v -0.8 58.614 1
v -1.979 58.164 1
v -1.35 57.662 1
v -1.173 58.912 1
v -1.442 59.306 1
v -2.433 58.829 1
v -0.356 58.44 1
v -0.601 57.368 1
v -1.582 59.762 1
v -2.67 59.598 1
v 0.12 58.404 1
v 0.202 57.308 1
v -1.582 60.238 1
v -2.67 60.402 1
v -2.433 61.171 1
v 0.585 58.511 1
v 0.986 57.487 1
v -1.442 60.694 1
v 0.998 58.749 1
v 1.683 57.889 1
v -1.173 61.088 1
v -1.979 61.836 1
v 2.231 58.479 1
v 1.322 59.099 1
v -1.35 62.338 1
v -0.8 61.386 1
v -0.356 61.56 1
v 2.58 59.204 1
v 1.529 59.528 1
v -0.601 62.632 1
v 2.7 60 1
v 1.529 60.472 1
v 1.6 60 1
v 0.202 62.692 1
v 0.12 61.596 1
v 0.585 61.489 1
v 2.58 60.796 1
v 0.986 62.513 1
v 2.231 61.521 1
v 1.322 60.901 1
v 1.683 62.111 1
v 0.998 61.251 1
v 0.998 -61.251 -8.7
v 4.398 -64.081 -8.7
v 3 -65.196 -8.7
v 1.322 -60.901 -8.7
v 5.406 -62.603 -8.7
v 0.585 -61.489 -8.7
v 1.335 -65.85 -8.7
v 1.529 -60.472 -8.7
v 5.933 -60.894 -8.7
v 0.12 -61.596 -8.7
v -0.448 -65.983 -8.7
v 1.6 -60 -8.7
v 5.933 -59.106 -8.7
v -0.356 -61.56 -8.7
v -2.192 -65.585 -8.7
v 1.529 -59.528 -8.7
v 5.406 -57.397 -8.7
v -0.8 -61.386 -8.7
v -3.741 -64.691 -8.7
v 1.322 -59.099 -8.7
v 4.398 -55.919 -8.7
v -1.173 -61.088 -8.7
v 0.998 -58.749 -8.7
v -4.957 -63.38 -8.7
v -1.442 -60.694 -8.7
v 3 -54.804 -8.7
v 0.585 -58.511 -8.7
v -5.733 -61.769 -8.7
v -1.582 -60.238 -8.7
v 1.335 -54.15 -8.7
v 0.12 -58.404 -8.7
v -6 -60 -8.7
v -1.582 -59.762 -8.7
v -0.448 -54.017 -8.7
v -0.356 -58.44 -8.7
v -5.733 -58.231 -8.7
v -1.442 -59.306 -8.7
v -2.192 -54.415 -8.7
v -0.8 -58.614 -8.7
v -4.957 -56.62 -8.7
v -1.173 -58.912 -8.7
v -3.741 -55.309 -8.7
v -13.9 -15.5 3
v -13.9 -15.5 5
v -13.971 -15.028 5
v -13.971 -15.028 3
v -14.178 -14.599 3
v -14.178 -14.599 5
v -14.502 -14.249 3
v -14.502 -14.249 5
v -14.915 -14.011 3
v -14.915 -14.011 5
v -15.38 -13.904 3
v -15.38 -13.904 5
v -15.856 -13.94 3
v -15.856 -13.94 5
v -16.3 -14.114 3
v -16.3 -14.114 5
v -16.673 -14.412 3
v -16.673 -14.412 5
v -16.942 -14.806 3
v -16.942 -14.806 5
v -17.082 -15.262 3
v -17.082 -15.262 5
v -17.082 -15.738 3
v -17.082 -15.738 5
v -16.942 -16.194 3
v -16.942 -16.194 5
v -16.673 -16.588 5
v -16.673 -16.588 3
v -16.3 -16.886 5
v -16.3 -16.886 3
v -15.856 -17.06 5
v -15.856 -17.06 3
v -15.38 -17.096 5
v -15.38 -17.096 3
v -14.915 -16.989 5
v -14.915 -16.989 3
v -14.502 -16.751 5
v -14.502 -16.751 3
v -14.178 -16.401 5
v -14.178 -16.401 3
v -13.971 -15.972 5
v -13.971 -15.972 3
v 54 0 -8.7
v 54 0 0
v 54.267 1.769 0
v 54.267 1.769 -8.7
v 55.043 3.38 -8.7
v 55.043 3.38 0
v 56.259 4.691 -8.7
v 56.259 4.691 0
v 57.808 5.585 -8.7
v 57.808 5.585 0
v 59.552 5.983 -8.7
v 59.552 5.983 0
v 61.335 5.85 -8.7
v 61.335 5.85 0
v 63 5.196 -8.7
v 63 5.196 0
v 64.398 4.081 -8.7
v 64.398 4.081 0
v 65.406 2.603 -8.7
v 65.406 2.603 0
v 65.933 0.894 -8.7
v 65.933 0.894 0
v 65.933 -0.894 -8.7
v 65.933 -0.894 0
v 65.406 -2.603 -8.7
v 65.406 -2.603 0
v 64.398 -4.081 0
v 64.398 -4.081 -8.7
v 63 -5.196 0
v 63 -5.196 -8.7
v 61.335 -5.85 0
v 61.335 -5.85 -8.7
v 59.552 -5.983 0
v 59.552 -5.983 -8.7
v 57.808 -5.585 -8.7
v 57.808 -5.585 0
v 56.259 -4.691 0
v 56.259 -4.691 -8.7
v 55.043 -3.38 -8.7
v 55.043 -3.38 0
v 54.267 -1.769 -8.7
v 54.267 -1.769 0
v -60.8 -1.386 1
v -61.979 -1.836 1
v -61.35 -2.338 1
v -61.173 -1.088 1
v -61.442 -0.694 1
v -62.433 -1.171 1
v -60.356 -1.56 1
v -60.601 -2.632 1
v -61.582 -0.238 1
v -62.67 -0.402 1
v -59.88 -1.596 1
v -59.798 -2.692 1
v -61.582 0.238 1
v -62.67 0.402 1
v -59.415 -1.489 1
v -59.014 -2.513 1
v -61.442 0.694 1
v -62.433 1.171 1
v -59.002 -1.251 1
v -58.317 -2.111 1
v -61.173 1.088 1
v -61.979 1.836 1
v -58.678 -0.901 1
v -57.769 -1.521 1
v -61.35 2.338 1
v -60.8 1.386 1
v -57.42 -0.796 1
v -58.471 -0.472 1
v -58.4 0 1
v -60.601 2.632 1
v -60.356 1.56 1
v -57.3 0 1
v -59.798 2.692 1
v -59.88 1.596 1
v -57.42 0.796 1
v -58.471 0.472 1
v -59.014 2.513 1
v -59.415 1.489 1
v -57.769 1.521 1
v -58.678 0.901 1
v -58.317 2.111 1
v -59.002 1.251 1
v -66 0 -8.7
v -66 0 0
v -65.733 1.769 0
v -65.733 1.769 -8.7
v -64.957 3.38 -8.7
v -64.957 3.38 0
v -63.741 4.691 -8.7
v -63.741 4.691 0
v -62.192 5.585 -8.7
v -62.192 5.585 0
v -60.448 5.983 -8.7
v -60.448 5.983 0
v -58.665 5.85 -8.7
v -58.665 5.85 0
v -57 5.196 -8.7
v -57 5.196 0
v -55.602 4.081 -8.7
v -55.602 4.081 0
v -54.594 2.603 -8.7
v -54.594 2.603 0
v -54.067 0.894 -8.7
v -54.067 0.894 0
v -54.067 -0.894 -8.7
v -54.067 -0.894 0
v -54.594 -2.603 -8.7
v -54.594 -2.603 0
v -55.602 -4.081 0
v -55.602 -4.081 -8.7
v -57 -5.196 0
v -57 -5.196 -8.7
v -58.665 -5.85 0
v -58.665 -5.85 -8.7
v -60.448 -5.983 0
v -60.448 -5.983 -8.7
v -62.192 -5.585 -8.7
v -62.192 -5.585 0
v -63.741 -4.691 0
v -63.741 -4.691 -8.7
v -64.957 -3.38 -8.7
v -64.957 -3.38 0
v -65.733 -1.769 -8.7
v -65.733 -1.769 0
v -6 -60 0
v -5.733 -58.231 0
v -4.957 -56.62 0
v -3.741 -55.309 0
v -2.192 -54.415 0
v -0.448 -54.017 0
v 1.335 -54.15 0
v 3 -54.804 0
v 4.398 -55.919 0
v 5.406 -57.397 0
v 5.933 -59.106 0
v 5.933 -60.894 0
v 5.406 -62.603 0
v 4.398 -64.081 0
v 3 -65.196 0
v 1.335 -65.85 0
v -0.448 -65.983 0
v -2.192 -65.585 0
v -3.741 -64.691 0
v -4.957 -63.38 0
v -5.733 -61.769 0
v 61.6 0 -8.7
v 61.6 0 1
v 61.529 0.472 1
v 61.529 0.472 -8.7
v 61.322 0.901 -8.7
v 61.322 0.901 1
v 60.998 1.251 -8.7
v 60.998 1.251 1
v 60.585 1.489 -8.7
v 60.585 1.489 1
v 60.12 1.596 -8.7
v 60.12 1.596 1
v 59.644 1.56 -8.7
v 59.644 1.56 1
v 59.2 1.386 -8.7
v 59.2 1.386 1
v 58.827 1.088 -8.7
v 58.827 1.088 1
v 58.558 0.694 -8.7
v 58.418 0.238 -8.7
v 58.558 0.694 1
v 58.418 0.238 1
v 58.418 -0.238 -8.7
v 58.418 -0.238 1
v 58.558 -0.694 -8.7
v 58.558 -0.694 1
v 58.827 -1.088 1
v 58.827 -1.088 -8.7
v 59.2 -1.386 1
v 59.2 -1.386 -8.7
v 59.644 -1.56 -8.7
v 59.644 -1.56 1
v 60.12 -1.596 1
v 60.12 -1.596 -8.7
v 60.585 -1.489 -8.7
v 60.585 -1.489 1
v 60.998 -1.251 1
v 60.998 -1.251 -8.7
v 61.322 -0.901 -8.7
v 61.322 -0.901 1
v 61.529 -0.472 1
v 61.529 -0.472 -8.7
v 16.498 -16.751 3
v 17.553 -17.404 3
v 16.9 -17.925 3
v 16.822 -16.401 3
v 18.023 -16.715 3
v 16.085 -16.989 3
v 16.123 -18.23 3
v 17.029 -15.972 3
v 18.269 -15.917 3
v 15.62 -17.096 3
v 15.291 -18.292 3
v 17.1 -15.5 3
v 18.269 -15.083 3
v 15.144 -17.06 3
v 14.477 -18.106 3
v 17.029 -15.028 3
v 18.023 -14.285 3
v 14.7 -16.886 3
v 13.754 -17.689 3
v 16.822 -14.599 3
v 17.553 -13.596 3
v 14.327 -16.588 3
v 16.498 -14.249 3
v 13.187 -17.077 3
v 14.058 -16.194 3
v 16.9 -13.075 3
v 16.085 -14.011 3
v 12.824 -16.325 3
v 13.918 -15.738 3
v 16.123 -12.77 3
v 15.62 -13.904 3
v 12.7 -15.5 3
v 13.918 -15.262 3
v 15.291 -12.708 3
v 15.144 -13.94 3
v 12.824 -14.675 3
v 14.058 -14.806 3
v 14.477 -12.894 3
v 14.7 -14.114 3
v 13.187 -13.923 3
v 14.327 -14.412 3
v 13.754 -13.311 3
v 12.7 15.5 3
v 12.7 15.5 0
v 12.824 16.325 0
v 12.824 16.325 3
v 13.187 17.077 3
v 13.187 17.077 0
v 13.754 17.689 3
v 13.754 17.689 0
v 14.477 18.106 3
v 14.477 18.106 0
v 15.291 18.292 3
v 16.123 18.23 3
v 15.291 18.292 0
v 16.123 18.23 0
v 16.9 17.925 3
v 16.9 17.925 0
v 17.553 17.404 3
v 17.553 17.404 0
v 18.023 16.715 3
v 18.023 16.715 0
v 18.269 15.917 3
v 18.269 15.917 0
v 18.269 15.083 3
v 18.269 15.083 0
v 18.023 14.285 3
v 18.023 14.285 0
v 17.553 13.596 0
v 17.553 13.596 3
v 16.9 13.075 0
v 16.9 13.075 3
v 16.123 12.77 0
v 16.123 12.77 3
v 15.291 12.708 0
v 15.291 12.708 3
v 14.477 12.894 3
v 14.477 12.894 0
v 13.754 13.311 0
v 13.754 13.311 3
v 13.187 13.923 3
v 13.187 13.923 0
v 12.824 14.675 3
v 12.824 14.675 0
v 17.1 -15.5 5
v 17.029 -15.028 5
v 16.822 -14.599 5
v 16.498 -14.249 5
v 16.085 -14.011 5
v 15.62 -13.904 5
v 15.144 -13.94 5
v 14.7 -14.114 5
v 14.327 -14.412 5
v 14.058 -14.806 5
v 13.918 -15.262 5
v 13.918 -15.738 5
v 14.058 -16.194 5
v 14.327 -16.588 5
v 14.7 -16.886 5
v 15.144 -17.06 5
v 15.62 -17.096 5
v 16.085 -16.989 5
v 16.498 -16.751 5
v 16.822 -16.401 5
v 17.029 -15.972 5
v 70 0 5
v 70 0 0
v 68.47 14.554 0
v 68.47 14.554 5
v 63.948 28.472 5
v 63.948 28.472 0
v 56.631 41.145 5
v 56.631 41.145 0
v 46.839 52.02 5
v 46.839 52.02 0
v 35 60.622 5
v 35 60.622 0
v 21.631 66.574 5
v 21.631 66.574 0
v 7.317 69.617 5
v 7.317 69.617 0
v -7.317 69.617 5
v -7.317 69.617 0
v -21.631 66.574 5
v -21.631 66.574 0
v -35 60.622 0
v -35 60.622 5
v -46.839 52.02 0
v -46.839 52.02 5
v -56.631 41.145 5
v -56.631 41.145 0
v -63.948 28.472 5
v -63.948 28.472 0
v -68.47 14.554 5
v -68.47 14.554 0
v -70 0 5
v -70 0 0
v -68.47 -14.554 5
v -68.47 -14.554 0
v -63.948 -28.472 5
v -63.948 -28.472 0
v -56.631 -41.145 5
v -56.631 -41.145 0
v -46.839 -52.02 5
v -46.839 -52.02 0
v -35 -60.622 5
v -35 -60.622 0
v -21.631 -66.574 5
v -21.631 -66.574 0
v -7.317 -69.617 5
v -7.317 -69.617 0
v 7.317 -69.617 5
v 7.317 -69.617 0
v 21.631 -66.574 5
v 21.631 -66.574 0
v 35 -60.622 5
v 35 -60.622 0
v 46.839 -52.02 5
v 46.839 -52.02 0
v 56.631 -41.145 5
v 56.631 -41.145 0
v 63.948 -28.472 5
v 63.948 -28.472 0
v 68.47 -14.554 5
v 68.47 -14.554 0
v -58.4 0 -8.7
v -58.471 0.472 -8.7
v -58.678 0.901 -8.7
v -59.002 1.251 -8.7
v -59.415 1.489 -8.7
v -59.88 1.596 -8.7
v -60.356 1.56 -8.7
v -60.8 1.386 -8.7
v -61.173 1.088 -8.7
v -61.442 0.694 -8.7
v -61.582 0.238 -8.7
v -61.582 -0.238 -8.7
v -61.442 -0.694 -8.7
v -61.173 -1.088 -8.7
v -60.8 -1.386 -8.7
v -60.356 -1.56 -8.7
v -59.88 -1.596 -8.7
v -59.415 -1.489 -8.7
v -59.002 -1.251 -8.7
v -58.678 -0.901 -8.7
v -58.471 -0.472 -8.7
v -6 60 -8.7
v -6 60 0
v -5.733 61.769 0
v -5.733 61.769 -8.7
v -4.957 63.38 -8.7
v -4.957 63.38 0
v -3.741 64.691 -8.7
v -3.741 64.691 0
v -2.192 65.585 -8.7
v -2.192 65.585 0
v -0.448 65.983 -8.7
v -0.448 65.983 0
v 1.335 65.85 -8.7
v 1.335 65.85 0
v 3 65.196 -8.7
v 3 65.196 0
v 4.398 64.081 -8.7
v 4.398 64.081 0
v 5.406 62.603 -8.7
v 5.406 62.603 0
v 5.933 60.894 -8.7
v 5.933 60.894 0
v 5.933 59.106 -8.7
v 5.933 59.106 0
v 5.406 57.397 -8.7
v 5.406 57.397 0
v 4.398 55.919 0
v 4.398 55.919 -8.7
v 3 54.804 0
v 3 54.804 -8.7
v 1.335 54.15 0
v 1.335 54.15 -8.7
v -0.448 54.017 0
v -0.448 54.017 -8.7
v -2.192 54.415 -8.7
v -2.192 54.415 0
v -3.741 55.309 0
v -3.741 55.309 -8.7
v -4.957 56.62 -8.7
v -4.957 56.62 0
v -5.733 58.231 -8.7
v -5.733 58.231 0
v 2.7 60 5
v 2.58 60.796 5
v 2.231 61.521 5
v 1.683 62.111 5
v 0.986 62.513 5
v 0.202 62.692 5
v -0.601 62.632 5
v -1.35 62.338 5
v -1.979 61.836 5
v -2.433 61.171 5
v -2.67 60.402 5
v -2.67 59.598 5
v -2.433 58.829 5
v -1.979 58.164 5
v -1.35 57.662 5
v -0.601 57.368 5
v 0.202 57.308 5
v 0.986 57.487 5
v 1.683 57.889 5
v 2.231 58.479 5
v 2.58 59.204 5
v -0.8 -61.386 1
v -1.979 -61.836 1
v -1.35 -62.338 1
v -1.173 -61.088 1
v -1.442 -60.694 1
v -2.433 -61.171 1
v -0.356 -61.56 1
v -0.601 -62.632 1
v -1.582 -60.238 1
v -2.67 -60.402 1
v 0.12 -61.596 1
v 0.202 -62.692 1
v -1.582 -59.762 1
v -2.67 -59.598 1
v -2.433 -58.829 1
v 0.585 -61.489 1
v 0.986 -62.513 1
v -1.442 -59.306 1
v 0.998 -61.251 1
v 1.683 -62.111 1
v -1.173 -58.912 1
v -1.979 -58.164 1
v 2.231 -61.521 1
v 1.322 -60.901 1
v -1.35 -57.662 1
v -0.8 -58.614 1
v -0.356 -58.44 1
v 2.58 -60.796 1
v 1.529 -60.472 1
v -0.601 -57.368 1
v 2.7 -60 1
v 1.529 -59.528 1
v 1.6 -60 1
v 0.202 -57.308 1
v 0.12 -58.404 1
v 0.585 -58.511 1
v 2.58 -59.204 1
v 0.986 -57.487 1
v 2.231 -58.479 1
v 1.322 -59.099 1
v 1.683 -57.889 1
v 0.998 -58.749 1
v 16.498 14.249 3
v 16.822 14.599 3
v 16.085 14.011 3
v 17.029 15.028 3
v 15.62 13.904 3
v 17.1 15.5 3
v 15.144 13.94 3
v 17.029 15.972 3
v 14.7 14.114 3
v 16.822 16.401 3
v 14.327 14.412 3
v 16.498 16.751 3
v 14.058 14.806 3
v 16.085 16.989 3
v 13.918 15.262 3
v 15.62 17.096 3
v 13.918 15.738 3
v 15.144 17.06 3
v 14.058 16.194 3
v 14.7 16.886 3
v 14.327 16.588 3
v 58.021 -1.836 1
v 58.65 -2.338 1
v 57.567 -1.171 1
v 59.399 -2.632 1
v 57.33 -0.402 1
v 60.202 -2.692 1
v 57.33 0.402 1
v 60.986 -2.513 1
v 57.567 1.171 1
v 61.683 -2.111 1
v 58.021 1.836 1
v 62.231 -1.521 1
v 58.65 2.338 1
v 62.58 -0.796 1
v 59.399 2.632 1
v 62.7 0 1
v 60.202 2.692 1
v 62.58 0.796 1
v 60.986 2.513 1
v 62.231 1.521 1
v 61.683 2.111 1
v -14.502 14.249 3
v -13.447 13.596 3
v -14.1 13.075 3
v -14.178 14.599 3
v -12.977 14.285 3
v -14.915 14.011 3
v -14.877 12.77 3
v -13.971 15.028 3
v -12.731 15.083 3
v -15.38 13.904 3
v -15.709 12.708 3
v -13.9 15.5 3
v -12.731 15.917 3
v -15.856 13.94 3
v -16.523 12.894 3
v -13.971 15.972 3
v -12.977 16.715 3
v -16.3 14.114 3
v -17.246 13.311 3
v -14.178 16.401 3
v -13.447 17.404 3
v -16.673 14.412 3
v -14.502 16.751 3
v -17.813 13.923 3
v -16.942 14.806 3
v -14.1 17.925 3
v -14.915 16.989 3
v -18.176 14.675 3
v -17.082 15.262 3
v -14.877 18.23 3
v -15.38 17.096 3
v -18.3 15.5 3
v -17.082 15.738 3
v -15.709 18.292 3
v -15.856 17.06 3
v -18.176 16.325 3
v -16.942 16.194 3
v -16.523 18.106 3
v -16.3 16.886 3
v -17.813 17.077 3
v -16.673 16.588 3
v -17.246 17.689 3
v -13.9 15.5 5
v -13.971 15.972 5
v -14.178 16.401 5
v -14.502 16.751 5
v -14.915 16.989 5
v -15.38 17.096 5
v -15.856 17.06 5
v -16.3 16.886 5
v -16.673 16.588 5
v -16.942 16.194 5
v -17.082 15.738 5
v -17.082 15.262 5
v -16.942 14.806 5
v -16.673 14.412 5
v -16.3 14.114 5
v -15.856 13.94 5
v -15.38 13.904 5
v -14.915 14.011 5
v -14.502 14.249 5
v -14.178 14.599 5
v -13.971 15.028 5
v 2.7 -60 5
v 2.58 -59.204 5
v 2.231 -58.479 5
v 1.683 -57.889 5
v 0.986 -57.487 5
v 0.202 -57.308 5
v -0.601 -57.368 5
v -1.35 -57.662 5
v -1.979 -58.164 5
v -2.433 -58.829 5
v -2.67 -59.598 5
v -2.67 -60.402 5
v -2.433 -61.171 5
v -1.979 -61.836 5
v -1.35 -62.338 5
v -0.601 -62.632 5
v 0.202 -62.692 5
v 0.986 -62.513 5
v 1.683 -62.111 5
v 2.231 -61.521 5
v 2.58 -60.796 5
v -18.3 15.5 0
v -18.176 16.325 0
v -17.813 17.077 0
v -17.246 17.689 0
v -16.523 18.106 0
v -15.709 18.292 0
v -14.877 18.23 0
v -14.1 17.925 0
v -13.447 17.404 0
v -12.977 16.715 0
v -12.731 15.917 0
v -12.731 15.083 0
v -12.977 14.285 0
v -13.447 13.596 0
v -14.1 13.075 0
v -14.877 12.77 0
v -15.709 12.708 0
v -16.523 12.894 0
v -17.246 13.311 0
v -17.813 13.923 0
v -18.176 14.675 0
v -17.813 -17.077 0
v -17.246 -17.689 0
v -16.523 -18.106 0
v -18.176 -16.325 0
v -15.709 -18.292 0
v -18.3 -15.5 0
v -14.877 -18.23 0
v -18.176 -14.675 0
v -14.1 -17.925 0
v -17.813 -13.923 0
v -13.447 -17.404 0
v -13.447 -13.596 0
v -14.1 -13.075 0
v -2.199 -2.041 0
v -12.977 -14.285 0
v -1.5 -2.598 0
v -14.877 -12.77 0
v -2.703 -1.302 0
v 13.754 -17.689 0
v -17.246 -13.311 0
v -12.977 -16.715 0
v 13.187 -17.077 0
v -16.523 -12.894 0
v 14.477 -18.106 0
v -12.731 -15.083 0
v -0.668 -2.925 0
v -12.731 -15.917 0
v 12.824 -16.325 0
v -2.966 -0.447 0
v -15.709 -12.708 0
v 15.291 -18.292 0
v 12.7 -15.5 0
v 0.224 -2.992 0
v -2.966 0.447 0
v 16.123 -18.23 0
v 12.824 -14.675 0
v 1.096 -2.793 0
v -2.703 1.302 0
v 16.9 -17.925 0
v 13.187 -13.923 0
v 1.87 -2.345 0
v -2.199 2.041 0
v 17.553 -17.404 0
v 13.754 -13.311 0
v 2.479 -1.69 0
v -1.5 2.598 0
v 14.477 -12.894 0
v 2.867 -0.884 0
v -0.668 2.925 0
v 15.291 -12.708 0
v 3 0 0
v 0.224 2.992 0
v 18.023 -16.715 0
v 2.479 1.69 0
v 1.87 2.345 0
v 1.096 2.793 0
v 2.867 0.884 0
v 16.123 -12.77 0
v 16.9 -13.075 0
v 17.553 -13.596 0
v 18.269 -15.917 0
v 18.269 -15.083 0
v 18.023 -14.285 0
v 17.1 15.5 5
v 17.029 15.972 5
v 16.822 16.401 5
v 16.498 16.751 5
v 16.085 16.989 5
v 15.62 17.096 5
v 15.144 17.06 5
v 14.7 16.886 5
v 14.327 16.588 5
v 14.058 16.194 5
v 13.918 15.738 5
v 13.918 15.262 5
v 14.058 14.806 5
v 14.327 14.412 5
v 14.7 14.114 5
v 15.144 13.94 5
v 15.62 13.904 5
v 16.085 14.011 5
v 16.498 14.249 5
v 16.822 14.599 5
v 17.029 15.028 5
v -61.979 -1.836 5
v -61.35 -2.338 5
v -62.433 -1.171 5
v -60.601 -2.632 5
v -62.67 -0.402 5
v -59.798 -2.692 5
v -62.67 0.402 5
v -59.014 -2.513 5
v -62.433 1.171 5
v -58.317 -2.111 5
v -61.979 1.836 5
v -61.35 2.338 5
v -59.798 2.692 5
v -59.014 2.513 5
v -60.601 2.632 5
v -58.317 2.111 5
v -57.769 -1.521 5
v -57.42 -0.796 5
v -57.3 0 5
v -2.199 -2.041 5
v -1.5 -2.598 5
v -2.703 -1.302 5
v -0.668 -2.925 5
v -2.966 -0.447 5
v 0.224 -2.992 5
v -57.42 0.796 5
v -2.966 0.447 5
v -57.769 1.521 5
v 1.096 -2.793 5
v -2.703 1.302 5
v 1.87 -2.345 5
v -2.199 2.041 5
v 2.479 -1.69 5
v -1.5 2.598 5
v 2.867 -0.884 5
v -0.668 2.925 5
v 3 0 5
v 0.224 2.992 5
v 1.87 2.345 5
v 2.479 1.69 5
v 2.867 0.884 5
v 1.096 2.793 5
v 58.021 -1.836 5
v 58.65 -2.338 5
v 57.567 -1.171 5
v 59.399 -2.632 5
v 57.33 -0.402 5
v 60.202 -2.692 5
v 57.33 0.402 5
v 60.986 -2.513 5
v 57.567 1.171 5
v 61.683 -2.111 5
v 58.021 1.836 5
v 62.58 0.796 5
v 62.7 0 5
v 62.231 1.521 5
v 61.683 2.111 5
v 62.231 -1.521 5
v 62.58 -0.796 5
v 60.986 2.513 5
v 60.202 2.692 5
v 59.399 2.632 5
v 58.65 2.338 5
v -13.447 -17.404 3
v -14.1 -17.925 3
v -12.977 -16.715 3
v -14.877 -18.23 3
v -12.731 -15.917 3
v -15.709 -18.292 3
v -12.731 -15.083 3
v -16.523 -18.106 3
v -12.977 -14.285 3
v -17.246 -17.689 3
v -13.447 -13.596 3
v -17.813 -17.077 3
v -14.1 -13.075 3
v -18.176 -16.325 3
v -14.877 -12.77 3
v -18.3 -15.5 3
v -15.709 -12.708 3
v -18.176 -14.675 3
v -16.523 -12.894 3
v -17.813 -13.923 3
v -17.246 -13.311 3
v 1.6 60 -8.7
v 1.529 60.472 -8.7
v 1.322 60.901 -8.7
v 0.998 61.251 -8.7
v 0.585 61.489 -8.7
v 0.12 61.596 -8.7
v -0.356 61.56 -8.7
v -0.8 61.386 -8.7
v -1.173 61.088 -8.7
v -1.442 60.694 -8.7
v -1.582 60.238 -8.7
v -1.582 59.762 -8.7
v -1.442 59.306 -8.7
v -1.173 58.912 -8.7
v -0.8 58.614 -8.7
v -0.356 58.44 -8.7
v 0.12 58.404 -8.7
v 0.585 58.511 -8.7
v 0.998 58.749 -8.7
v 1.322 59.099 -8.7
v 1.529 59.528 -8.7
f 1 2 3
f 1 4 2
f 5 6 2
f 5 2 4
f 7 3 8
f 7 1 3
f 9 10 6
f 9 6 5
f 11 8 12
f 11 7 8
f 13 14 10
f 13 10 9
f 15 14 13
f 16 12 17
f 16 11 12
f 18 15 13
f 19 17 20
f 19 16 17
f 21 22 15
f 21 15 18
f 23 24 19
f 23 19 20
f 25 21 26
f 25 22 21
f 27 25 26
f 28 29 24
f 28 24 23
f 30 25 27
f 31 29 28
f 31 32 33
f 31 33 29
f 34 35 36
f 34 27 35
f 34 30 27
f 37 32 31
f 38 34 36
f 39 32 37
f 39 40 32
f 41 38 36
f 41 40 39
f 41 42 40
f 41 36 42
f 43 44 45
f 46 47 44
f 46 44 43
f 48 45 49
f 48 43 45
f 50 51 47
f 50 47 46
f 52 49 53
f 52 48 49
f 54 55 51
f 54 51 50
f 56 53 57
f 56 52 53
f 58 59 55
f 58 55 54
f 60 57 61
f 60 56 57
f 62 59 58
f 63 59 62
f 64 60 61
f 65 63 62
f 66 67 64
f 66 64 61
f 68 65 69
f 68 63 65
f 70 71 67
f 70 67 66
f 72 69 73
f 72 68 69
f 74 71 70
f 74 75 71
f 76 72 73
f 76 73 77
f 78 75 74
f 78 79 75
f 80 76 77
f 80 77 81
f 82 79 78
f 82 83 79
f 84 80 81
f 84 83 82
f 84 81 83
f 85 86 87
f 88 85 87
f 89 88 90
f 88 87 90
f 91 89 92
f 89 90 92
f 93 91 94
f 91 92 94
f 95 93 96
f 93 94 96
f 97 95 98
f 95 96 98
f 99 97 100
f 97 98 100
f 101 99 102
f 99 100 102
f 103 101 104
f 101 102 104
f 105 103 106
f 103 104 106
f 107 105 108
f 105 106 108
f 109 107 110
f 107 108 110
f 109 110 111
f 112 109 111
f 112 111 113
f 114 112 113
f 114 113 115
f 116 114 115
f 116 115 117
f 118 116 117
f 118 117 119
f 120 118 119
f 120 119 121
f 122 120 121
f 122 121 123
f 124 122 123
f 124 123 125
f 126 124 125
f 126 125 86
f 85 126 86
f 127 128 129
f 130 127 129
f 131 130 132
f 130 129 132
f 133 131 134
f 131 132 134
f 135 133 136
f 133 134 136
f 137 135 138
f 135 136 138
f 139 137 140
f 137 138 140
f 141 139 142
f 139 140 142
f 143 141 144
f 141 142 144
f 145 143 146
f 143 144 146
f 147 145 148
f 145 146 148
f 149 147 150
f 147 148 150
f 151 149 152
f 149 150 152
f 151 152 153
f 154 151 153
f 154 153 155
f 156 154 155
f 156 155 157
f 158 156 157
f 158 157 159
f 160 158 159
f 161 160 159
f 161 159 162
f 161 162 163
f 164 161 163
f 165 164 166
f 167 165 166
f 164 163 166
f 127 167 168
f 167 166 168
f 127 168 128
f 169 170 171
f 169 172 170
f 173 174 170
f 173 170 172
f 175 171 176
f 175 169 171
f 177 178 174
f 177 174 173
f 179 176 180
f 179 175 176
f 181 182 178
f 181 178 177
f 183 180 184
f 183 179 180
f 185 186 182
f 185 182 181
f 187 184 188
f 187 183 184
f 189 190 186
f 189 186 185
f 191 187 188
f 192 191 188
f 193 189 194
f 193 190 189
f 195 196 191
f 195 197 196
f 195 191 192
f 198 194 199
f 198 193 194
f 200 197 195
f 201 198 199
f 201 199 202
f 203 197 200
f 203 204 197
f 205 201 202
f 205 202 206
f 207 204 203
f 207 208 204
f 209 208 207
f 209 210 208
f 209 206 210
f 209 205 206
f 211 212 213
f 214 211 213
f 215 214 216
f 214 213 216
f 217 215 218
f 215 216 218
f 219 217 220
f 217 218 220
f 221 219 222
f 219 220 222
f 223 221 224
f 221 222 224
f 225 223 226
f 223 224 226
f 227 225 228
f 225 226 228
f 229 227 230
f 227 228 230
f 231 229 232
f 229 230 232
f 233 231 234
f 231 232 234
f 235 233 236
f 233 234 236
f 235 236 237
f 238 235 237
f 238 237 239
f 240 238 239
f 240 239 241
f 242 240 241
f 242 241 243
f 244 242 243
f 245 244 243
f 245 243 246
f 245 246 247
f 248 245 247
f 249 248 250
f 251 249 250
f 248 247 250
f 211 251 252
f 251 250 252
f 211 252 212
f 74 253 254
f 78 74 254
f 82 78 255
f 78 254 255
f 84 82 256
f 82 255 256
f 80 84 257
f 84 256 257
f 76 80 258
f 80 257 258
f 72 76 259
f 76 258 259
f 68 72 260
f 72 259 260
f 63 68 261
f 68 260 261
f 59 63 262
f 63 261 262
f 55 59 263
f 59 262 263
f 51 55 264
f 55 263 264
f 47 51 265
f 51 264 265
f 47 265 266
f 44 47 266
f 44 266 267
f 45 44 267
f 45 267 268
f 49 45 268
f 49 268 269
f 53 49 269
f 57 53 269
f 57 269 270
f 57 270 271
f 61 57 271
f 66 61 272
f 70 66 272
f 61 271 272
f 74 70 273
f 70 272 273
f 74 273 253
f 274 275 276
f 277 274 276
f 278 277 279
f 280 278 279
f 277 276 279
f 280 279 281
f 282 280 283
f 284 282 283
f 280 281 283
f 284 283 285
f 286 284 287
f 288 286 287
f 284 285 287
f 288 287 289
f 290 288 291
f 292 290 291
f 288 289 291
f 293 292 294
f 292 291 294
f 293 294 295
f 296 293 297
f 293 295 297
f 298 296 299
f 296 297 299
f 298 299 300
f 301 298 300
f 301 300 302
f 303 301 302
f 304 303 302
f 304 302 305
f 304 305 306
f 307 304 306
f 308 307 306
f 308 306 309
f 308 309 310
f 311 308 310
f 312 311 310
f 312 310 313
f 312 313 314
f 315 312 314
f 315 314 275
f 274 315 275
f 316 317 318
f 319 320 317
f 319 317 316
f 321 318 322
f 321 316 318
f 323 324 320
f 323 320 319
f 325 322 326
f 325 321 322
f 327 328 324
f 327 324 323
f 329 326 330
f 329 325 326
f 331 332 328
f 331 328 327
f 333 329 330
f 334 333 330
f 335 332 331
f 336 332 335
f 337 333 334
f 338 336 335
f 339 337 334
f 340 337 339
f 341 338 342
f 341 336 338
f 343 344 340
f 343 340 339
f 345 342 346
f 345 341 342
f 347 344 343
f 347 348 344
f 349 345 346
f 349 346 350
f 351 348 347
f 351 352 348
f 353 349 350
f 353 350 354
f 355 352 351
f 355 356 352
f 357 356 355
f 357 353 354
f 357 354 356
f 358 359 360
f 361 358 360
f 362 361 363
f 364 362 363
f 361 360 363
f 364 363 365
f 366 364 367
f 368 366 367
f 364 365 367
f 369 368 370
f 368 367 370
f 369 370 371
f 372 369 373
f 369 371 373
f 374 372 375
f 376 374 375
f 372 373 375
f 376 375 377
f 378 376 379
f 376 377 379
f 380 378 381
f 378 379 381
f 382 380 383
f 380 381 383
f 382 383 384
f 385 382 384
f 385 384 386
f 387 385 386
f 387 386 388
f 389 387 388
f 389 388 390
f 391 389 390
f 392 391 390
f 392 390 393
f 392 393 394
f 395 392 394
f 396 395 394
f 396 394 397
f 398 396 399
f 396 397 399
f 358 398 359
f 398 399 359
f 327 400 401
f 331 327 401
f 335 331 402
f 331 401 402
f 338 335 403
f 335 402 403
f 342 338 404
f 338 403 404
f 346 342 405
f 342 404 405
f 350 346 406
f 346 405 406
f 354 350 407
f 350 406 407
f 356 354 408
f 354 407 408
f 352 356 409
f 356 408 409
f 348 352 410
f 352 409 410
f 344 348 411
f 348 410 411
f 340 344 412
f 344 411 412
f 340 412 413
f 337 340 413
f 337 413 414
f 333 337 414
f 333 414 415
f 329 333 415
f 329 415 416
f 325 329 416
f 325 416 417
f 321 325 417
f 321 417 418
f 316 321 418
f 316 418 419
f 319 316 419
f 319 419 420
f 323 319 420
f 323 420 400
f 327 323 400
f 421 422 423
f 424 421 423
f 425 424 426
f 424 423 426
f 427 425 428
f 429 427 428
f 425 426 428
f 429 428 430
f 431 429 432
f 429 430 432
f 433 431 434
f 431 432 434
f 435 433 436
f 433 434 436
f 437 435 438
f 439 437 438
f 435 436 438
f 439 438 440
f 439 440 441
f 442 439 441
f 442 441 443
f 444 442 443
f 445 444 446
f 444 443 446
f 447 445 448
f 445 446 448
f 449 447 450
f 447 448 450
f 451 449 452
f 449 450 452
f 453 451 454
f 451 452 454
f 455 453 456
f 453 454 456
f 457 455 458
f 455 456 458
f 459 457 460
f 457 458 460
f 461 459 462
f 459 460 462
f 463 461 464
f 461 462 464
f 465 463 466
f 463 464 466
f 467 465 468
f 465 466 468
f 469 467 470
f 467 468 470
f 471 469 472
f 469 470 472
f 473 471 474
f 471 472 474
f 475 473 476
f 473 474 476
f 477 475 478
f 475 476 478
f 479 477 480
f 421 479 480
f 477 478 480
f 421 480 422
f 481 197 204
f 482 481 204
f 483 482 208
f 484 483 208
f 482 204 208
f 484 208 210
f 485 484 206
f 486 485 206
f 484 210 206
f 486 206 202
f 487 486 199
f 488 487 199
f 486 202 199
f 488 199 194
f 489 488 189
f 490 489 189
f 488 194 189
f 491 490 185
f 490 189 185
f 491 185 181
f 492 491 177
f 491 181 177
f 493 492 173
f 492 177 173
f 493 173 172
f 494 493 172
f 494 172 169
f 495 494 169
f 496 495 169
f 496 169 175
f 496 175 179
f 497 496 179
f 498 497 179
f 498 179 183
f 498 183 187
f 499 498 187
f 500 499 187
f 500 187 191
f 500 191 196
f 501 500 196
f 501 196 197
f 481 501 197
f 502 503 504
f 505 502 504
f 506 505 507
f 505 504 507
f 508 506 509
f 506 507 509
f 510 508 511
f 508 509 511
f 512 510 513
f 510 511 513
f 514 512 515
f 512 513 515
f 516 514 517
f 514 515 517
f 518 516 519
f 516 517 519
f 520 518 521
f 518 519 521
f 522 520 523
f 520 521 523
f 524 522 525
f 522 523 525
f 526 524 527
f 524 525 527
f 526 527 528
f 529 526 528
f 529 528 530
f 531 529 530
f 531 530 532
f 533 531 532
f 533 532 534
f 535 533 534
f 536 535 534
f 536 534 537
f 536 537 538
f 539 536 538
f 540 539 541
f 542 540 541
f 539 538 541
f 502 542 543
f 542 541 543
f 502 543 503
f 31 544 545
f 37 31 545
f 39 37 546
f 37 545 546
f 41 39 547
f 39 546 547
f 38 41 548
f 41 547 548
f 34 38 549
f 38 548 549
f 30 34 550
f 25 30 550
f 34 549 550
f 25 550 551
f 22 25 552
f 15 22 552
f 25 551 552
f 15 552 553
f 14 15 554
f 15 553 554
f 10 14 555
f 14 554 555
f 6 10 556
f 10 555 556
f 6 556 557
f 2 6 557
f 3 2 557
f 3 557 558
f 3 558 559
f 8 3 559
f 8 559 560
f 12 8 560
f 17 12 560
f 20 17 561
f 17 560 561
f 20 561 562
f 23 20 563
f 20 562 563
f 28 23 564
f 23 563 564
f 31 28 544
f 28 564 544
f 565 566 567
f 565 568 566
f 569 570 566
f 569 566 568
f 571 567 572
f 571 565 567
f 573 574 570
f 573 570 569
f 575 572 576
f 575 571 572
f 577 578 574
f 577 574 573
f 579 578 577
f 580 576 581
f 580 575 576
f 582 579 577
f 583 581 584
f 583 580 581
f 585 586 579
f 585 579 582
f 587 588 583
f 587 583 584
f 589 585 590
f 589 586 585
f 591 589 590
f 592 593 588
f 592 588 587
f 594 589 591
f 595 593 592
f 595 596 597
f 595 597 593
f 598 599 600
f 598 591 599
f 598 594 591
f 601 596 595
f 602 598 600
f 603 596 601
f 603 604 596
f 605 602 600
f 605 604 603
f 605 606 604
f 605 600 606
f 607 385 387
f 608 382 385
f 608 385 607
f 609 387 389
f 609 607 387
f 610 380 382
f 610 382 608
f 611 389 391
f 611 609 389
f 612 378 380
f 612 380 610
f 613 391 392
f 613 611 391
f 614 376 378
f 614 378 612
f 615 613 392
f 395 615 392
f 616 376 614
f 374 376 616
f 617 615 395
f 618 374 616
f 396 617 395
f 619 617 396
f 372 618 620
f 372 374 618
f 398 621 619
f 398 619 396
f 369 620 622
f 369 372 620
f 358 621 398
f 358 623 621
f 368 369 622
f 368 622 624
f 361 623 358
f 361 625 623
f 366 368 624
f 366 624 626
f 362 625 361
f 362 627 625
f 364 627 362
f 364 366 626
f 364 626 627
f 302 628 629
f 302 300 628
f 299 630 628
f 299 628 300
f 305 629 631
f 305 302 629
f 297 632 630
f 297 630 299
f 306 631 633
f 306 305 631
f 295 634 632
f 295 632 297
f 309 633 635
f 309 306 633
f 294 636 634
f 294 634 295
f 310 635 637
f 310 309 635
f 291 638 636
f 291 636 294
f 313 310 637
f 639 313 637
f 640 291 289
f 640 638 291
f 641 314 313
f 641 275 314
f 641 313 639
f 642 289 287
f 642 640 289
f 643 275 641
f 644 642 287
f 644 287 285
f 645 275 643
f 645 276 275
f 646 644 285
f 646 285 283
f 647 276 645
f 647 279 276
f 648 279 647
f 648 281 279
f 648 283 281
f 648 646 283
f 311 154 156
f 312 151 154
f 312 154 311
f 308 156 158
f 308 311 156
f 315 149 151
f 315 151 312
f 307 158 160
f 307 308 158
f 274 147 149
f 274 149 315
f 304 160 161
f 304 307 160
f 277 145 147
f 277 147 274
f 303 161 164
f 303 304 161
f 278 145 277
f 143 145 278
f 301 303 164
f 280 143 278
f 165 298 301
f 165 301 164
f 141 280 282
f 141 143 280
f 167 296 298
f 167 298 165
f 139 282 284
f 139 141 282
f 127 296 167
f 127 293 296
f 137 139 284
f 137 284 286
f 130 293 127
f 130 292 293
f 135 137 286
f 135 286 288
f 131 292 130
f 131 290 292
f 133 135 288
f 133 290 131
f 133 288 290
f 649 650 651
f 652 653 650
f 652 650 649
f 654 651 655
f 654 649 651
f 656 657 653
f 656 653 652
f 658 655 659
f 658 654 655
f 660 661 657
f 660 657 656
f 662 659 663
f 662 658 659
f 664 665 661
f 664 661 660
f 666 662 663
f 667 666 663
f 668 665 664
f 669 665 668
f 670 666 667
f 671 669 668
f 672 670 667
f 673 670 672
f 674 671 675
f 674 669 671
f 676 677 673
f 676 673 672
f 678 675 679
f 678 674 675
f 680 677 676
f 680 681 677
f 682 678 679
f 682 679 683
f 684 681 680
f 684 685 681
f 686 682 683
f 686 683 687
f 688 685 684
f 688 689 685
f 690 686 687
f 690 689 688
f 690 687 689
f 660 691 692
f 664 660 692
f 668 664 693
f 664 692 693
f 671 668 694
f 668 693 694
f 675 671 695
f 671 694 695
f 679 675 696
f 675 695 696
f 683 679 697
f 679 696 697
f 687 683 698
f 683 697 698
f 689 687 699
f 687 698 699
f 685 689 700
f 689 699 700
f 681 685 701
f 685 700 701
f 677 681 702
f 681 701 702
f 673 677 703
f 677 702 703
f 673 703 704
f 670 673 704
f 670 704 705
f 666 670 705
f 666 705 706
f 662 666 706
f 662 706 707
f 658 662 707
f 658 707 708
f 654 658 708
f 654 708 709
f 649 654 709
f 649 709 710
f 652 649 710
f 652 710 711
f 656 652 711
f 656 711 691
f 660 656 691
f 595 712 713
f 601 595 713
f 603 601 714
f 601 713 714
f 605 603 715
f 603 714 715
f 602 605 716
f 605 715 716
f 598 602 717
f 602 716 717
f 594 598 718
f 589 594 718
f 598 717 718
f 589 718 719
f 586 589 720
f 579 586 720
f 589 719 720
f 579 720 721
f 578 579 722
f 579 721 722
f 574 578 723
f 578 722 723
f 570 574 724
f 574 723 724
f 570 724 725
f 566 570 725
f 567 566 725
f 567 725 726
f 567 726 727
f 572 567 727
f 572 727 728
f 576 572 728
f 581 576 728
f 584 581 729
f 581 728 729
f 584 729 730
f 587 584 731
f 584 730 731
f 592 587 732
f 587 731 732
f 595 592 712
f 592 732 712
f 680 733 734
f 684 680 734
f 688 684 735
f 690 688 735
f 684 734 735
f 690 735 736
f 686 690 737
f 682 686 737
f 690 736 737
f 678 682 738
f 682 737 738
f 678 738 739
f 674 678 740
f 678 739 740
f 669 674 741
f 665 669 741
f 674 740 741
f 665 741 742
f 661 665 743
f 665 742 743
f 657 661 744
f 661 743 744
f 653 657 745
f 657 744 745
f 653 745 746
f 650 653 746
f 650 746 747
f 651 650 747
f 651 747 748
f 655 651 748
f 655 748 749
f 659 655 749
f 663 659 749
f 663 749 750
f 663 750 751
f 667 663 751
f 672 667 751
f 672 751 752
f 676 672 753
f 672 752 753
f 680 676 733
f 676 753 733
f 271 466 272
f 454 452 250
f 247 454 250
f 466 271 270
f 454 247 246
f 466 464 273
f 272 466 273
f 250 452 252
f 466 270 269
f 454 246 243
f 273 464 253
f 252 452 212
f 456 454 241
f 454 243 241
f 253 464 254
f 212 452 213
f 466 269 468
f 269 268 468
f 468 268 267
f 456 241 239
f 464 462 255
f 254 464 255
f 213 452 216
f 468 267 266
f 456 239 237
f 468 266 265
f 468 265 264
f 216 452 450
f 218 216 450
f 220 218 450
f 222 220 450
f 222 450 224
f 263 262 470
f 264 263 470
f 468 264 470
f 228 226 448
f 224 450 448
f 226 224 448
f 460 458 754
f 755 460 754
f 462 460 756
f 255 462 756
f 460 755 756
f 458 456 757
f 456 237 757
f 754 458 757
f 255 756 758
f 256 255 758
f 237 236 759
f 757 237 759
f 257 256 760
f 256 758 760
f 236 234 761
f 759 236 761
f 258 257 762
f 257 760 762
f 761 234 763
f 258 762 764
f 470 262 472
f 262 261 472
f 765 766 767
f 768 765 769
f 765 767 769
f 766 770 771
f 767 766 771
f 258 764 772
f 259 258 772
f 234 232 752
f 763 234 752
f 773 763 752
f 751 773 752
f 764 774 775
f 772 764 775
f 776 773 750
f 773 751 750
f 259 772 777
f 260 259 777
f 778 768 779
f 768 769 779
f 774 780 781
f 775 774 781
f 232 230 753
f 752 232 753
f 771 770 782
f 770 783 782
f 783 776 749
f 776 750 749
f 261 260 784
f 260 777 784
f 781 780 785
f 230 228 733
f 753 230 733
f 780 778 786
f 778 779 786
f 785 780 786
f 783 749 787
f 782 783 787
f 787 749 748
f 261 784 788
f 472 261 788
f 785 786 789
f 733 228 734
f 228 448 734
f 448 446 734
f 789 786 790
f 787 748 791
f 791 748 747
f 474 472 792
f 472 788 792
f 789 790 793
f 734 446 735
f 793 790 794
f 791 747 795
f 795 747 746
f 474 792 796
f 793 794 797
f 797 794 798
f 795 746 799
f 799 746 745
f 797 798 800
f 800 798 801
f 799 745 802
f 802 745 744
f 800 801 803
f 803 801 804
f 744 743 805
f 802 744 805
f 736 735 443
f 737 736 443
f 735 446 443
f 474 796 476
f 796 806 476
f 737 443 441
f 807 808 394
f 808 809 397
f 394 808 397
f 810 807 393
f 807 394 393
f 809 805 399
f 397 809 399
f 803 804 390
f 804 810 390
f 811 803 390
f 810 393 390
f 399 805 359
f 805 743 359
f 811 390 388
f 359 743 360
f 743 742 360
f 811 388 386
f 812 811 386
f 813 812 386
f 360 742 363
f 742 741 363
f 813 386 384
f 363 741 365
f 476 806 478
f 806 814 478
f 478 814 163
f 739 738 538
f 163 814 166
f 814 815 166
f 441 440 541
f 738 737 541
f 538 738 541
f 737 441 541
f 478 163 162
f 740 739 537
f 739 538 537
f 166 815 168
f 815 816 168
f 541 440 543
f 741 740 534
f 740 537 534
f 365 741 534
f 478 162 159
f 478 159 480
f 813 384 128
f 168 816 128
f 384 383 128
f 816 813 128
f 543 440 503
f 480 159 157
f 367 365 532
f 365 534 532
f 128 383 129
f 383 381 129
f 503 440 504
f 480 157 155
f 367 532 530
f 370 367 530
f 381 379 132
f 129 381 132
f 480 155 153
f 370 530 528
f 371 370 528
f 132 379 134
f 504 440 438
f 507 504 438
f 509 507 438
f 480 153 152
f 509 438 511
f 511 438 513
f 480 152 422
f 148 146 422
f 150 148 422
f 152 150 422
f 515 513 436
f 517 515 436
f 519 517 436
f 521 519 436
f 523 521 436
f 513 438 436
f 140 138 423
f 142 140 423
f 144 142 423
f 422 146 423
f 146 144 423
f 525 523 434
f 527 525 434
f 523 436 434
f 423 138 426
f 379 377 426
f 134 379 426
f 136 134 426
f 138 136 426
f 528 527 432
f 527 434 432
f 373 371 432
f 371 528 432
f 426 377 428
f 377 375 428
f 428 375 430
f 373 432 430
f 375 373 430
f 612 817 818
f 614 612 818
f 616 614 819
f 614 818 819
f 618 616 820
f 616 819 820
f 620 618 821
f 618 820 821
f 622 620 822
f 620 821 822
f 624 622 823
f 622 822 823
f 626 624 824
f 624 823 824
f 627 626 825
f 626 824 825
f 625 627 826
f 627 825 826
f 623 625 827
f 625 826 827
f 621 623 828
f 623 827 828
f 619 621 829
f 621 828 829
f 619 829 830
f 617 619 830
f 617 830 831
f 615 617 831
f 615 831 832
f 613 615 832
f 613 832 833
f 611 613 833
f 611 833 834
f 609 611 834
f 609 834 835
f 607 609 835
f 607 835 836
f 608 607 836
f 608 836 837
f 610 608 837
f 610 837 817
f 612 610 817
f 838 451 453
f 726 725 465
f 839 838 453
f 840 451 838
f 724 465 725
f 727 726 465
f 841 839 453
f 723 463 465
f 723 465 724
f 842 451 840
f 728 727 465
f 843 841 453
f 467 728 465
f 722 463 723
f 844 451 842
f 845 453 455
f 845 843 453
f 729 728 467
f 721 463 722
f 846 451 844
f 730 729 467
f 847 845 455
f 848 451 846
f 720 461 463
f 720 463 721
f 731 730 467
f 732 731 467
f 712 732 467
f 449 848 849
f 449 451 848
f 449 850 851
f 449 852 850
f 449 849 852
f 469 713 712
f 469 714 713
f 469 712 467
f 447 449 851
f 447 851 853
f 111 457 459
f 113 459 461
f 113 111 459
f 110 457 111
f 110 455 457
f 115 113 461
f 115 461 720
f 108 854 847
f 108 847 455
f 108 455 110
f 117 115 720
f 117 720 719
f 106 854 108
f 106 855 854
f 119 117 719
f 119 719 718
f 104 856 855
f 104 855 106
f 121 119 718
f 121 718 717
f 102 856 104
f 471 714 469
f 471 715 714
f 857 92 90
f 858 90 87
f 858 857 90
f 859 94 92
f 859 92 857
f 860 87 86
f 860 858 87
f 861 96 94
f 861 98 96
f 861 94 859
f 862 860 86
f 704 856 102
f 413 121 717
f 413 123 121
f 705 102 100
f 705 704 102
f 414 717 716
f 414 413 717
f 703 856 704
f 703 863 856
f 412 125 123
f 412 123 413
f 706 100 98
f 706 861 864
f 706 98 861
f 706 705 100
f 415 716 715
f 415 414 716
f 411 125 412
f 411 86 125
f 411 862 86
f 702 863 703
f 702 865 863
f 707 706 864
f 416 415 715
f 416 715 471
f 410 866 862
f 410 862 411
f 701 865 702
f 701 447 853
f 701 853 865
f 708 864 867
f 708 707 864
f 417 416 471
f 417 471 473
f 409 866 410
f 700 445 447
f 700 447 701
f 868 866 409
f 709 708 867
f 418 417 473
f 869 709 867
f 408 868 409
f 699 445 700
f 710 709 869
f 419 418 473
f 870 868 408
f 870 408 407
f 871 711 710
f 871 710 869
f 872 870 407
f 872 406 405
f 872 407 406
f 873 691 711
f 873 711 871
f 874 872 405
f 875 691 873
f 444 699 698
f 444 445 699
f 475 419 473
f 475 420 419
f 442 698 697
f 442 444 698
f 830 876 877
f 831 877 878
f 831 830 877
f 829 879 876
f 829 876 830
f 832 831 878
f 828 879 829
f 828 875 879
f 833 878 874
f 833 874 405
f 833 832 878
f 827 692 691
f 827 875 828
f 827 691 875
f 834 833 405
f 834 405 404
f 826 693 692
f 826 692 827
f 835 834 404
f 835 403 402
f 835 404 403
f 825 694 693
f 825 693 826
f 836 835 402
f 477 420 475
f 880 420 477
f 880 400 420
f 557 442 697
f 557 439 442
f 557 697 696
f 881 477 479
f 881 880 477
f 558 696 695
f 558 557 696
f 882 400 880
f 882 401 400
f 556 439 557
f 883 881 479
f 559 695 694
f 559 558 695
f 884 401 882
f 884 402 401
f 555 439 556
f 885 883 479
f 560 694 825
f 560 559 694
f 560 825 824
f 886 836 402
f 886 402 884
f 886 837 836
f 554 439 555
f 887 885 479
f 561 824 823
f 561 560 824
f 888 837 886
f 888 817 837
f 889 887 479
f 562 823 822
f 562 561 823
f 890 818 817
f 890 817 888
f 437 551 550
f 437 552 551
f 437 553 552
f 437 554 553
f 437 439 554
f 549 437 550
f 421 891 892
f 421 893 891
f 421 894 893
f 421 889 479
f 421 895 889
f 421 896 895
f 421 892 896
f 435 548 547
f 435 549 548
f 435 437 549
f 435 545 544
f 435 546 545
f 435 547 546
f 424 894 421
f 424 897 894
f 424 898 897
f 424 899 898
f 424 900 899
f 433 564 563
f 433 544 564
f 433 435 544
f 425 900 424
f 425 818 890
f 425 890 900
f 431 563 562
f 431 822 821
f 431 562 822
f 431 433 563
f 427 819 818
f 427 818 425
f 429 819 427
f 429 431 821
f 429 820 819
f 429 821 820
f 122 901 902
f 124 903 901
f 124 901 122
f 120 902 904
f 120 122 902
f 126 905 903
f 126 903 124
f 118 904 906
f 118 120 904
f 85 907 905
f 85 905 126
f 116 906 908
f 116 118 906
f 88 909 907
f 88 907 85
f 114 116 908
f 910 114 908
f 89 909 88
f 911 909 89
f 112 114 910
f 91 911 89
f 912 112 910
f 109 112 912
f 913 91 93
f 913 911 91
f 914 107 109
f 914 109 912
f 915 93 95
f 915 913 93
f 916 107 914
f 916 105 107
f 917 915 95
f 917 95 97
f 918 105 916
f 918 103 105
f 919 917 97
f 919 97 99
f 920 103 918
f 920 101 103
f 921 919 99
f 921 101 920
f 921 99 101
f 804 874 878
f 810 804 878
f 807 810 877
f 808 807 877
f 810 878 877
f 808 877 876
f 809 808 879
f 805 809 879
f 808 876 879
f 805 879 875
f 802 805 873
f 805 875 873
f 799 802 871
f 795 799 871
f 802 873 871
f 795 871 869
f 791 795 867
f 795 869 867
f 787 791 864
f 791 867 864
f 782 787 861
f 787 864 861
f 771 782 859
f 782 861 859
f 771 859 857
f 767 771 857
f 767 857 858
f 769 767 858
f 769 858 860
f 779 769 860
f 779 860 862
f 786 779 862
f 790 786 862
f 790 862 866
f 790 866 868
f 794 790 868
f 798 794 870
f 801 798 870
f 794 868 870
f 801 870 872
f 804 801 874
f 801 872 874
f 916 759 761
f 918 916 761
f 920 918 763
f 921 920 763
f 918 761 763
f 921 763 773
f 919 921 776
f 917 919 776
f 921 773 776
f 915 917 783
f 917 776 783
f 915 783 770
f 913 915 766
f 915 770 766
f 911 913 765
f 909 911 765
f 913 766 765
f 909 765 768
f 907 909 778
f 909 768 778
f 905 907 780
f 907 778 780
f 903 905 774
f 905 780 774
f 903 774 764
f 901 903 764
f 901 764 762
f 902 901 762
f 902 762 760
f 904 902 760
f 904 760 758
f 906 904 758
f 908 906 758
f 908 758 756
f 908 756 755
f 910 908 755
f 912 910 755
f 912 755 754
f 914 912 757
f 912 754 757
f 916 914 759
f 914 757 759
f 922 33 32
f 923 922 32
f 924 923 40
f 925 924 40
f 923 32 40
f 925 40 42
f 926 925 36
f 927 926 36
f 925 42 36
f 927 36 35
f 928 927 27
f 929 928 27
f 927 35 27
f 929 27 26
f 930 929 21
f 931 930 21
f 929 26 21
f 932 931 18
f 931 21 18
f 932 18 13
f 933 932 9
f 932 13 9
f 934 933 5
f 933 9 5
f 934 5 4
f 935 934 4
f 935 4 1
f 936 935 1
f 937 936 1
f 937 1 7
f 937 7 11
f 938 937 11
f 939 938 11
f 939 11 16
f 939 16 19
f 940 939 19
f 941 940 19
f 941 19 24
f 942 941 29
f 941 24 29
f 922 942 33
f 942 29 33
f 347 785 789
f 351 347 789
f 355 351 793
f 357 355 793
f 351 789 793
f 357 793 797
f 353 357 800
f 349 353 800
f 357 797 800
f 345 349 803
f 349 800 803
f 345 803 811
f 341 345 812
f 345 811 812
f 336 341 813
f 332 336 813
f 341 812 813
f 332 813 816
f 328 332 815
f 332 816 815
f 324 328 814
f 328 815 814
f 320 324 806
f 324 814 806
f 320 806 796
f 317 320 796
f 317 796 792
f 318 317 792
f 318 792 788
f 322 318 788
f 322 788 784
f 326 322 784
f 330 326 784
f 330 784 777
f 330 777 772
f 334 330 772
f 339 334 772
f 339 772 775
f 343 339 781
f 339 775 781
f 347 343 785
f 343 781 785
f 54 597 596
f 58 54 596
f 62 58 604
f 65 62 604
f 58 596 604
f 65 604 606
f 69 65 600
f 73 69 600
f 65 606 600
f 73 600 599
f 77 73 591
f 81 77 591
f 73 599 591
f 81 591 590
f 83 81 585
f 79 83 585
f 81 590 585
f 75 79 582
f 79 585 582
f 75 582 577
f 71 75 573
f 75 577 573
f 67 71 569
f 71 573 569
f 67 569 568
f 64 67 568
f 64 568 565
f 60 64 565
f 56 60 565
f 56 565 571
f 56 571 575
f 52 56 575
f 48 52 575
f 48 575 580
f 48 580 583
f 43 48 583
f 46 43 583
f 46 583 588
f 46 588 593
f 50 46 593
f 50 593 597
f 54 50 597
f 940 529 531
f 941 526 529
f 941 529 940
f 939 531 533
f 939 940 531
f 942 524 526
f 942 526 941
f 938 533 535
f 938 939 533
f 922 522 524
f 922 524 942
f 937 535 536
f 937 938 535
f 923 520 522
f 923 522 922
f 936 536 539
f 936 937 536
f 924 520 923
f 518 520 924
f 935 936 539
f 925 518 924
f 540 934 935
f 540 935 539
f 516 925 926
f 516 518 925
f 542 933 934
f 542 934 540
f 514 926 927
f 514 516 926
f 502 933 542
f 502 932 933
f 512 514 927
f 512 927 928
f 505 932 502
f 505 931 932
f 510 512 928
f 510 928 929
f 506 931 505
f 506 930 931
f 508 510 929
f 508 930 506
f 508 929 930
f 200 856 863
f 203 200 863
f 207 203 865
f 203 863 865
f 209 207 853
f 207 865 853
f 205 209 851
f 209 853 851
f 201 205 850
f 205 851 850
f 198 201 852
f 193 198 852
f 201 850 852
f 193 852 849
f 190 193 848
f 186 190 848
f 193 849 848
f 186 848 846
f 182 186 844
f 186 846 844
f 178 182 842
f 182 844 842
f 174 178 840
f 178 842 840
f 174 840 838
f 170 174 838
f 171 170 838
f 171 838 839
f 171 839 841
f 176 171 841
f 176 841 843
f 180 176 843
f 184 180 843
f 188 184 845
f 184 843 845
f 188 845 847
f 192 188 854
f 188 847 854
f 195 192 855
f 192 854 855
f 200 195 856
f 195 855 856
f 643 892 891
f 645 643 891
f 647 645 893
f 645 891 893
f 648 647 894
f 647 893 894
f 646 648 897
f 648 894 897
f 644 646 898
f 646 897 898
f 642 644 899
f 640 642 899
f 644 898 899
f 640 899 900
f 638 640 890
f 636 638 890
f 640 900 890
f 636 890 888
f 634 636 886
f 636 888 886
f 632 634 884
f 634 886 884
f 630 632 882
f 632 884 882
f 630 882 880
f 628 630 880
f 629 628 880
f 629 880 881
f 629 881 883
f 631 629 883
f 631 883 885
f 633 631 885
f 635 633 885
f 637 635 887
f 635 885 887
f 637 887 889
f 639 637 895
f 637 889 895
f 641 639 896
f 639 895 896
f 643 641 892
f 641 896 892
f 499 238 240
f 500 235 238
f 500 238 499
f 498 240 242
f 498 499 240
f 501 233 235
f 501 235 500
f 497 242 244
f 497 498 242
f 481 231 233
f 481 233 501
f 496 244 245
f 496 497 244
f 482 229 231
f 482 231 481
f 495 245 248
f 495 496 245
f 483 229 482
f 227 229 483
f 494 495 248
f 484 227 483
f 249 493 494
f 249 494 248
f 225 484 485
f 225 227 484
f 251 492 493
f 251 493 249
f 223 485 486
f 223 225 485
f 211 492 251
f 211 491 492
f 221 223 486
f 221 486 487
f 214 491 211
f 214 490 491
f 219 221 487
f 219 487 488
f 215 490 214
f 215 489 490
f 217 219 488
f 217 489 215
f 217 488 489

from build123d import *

# Parameters (mm, degrees)
SKETCH1_R           = 70
BOSS_EXTRUDE1_DEPTH = 5
SKETCH2_R           = 1.6
CUT_EXTRUDE1_DEPTH  = 15
SKETCH3_R           = 3
CUT_EXTRUDE2_DEPTH  = 5
SKETCH4_R           = 1.6
CUT_EXTRUDE3_DEPTH  = 5
SKETCH5_R           = 2.8
CUT_EXTRUDE4_DEPTH  = 3
SKETCH6_R           = 6
BOSS_EXTRUDE2_DEPTH = 8.7
SKETCH7_R           = 1.6
CUT_EXTRUDE5_DEPTH  = 15
SKETCH8_R           = 2.7
CUT_EXTRUDE6_DEPTH  = 4


with BuildPart() as part:
    # Sketch1 → Boss-Extrude1 (new body)
    with BuildSketch(Plane.XY):
        Circle(SKETCH1_R)
    extrude(amount=BOSS_EXTRUDE1_DEPTH)

    # Sketch2 → Cut-Extrude1 (cut)
    with BuildSketch(Plane.XY.offset(5)):
        with Locations((0, 60)):
            Circle(SKETCH2_R)
        with Locations((60, 0)):
            Circle(SKETCH2_R)
        with Locations((0, -60)):
            Circle(SKETCH2_R)
        with Locations((-60, 0)):
            Circle(SKETCH2_R)
    extrude(amount=-CUT_EXTRUDE1_DEPTH, mode=Mode.SUBTRACT)

    # Sketch3 → Cut-Extrude2 (cut)
    with BuildSketch(Plane.XY.offset(5)):
        Circle(SKETCH3_R)
    extrude(amount=-CUT_EXTRUDE2_DEPTH, mode=Mode.SUBTRACT)

    # Sketch4 → Cut-Extrude3 (cut)
    with BuildSketch(Plane.XY.offset(5)):
        with Locations((-15.5, 15.5)):
            Circle(SKETCH4_R)
        with Locations((15.5, 15.5)):
            Circle(SKETCH4_R)
        with Locations((15.5, -15.5)):
            Circle(SKETCH4_R)
        with Locations((-15.5, -15.5)):
            Circle(SKETCH4_R)
    extrude(amount=-CUT_EXTRUDE3_DEPTH, mode=Mode.SUBTRACT)

    # Sketch5 → Cut-Extrude4 (cut)
    with BuildSketch(Plane(origin=(0, 0, 0), x_dir=(-1, 0, 0), z_dir=(0, 0, -1))):
        with Locations((-15.5, 15.5)):
            Circle(SKETCH5_R)
        with Locations((15.5, 15.5)):
            Circle(SKETCH5_R)
        with Locations((15.5, -15.5)):
            Circle(SKETCH5_R)
        with Locations((-15.5, -15.5)):
            Circle(SKETCH5_R)
    extrude(amount=-CUT_EXTRUDE4_DEPTH, mode=Mode.SUBTRACT)

    # Sketch6 → Boss-Extrude2 (add)
    with BuildSketch(Plane(origin=(0, 0, 0), x_dir=(-1, 0, 0), z_dir=(0, 0, -1))):
        with Locations((0, 60)):
            Circle(SKETCH6_R)
        with Locations((60, 0)):
            Circle(SKETCH6_R)
        with Locations((0, -60)):
            Circle(SKETCH6_R)
        with Locations((-60, 0)):
            Circle(SKETCH6_R)
    extrude(amount=BOSS_EXTRUDE2_DEPTH)

    # Sketch7 → Cut-Extrude5 (cut)
    with BuildSketch(Plane.XY.offset(5)):
        with Locations((0, -60)):
            Circle(SKETCH7_R)
        with Locations((-60, 0)):
            Circle(SKETCH7_R)
        with Locations((0, 60)):
            Circle(SKETCH7_R)
        with Locations((60, 0)):
            Circle(SKETCH7_R)
    extrude(amount=-CUT_EXTRUDE5_DEPTH, mode=Mode.SUBTRACT)

    # Sketch8 → Cut-Extrude6 (cut)
    with BuildSketch(Plane.XY.offset(5)):
        with Locations((0, 60)):
            Circle(SKETCH8_R)
        with Locations((60, 0)):
            Circle(SKETCH8_R)
        with Locations((0, -60)):
            Circle(SKETCH8_R)
        with Locations((-60, 0)):
            Circle(SKETCH8_R)
    extrude(amount=-CUT_EXTRUDE6_DEPTH, mode=Mode.SUBTRACT)


solid = part.part
